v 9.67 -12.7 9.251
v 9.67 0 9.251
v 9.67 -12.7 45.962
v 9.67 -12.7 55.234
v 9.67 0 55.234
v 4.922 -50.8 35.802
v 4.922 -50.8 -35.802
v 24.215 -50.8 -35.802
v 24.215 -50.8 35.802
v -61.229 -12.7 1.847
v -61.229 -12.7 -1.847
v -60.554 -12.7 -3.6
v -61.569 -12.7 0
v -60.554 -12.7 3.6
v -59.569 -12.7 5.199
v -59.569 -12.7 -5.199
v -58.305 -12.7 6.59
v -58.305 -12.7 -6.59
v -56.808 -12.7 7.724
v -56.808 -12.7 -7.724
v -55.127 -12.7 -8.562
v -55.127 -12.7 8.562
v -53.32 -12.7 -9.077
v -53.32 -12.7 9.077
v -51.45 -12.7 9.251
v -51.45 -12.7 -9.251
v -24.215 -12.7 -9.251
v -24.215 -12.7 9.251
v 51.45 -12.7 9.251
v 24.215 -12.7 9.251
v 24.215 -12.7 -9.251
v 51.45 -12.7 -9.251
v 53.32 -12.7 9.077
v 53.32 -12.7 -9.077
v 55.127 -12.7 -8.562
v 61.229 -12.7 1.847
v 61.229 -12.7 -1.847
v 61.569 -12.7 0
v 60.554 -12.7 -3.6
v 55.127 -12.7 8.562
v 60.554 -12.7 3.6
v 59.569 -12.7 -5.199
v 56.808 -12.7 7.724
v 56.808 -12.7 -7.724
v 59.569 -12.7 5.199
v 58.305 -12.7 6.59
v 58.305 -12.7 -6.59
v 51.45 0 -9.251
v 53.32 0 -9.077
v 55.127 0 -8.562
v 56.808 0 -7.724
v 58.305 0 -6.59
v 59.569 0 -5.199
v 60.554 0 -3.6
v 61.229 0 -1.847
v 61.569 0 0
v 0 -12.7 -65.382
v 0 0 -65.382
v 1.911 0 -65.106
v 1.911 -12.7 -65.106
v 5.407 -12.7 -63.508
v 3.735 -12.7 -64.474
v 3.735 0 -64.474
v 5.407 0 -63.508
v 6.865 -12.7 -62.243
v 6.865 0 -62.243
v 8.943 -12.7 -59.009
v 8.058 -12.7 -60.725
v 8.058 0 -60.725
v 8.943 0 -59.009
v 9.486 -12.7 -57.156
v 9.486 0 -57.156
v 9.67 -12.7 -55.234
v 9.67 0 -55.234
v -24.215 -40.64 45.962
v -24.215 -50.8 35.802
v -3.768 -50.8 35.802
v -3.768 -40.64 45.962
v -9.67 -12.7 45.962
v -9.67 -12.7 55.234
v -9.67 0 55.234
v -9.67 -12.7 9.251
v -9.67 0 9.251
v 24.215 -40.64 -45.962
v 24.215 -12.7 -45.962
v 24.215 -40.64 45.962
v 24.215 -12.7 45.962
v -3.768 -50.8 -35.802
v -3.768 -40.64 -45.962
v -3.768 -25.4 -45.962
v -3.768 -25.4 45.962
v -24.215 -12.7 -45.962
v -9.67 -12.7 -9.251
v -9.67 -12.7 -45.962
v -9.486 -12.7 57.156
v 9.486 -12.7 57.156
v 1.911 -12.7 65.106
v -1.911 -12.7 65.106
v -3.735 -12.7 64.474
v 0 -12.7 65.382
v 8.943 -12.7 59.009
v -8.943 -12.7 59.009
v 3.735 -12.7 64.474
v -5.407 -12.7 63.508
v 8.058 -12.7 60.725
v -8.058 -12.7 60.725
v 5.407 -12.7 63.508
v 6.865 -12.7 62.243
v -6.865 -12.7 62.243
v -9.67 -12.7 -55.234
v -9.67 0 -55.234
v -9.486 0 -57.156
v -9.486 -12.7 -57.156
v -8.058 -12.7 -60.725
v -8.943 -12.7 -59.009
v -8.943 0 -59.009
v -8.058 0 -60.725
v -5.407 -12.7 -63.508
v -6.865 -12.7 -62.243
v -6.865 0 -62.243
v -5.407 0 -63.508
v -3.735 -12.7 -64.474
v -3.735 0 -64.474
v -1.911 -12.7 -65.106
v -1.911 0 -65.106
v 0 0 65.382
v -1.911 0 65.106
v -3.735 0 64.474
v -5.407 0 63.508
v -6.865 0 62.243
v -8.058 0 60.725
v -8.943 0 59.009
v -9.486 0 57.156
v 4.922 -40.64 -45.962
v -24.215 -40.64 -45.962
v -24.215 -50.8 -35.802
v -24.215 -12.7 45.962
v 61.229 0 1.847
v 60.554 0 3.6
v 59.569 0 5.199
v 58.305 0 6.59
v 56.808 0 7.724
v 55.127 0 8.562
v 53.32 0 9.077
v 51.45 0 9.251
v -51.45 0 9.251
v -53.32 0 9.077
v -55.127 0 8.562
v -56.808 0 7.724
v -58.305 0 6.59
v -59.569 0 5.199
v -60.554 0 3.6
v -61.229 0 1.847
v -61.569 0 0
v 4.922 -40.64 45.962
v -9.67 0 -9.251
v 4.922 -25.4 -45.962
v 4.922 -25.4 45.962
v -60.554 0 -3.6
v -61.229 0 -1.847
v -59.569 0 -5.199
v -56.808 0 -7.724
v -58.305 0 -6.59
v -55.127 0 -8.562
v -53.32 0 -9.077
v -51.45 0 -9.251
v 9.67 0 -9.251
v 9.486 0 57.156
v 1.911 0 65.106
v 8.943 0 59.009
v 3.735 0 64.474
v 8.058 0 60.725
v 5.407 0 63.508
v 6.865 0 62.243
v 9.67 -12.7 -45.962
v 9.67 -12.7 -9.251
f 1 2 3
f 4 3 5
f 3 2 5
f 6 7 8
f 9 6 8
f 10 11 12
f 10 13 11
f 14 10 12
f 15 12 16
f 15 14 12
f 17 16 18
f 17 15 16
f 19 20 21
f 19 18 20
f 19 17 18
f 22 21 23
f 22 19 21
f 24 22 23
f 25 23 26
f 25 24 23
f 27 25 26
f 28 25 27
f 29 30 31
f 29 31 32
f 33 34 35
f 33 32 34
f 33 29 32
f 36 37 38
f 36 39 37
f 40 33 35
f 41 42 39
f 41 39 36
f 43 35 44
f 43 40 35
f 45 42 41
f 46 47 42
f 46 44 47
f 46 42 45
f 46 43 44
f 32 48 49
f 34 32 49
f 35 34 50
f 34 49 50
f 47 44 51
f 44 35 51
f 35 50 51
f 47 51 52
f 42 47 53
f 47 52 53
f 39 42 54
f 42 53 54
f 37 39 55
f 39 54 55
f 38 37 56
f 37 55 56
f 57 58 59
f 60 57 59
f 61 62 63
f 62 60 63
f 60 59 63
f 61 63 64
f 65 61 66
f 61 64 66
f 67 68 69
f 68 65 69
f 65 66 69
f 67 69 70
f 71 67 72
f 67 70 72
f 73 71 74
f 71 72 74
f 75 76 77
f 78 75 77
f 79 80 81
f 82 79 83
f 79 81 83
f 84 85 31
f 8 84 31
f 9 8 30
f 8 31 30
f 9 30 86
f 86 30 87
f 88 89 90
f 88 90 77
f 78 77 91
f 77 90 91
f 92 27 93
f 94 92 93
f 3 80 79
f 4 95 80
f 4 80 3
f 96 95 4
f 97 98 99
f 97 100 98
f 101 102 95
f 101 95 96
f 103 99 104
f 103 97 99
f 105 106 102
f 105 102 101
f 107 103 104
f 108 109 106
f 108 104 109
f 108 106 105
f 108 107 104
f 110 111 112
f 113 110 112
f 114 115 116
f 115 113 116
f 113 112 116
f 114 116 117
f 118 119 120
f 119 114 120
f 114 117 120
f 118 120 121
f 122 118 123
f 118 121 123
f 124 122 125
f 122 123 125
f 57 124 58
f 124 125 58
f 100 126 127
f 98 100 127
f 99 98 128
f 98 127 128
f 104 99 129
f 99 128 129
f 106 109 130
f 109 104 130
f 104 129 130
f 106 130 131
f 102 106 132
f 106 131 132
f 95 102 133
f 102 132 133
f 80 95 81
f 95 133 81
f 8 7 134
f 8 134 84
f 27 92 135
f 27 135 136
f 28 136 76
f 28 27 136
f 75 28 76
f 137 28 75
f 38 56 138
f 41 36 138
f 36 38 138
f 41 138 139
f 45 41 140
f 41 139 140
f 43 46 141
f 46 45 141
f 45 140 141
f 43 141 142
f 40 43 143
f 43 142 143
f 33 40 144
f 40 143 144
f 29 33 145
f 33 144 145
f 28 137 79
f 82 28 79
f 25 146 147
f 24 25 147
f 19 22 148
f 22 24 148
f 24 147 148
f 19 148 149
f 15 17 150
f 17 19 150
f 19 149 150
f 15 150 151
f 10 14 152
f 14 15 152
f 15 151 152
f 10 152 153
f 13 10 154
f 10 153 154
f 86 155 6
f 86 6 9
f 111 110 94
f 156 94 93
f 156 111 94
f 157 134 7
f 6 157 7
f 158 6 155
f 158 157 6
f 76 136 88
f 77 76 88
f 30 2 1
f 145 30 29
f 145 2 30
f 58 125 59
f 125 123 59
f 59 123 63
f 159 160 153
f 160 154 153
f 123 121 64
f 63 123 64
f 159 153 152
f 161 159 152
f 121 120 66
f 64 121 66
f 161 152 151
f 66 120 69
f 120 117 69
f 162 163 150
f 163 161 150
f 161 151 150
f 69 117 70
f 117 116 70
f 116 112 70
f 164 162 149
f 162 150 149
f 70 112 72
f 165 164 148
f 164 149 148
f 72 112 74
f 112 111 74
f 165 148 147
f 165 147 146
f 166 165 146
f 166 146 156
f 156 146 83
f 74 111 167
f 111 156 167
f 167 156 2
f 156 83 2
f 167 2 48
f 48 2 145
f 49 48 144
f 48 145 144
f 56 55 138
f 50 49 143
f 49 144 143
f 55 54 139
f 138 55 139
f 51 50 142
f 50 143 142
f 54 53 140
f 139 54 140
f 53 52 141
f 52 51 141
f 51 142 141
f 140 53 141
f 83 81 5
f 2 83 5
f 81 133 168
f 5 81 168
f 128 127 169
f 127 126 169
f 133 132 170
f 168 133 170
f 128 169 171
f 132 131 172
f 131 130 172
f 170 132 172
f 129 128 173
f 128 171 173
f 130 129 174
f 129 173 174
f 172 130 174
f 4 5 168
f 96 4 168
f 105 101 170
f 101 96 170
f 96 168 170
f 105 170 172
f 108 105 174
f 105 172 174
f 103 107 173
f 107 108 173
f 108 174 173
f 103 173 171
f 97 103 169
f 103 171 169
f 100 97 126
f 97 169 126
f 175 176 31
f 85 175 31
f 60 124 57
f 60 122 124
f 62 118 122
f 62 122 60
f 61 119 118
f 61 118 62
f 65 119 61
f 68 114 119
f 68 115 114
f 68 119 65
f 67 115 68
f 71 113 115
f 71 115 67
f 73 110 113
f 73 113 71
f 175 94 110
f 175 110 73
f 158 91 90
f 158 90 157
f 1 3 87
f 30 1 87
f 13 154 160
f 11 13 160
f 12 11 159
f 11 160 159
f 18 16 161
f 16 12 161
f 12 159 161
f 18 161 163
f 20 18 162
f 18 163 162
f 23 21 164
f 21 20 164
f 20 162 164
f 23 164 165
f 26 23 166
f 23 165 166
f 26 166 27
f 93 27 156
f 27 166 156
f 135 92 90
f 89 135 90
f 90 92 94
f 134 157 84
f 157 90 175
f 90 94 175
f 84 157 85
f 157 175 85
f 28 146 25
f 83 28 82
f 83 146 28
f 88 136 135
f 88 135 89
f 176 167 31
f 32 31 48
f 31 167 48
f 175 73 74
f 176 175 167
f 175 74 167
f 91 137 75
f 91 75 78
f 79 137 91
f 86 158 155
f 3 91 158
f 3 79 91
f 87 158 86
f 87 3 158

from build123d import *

# Parameters (mm, degrees)
F0_W        = 19.3394050002
F0_H        = 56.1432316899
F0_W_2      = 51.9402250648
F0_H_2      = 18.5019075871
F1_DEPTH    = 12.7
F2_T1_DEPTH = 63.5
F3_W        = 48.4298244119
F3_H        = 91.9232070446
F4_DEPTH    = 12.7
F5_W        = 20.4465882853
F5_H        = 91.9232070446
F5_W_2      = 19.2932416685
F6_DEPTH    = 25.4
F7_SIZE     = 10.16


# Not quite as in the source:
# - a fillet or chamfer that OpenCascade refuses, or shapes differently, is made with other operations: its cross-section is extruded or revolved along the edge and cut away or added


with BuildPart() as f1:
    # F0 (on Front) → F1 (new body)
    with BuildSketch(Plane.XZ):
        with Locations((0, 37.3225696385)):
            Rectangle(F0_W, F0_H)
        with Locations((35.6398150325, 0)):
            Rectangle(F0_W_2, F0_H_2)
        Rectangle(F0_W, F0_H_2)
        with Locations((-35.6398150325, 0)):
            Rectangle(F0_W_2, F0_H_2)
        with Locations((0, -37.3225696385)):
            Rectangle(F0_W, F0_H)
    extrude(amount=F1_DEPTH)

    # F2: fillet of radius 10.16 on 8 edges, made by hand

    # F2_s2 → F2_t1 (cut)
    with BuildSketch(Plane.XZ.offset(-25.4)):
        with BuildLine():
            ThreePointArc((9.6697025001, 55.2341854835), (6.693907397, 62.4183903803), (-0.4902974999, 65.3941854835))
            Line((-0.4902974999, 65.3941854835), (9.6697025001, 65.3941854835))
            Line((9.6697025001, 65.3941854835), (9.6697025001, 55.2341854835))
        make_face()
        with BuildLine():
            ThreePointArc((0.4902974999, 65.3941854835), (-6.693907397, 62.4183903803), (-9.6697025001, 55.2341854835))
            Line((-9.6697025001, 55.2341854835), (-9.6697025001, 65.3941854835))
            Line((-9.6697025001, 65.3941854835), (0.4902974999, 65.3941854835))
        make_face()
        with BuildLine():
            ThreePointArc((61.6099275649, -0.9090462065), (58.6341324617, 6.2751586904), (51.4499275649, 9.2509537935))
            Line((51.4499275649, 9.2509537935), (61.6099275649, 9.2509537935))
            Line((61.6099275649, 9.2509537935), (61.6099275649, -0.9090462065))
        make_face()
        with BuildLine():
            ThreePointArc((51.4499275649, -9.2509537935), (58.6341324617, -6.2751586904), (61.6099275649, 0.9090462065))
            Line((61.6099275649, 0.9090462065), (61.6099275649, -9.2509537935))
            Line((61.6099275649, -9.2509537935), (51.4499275649, -9.2509537935))
        make_face()
        with BuildLine():
            ThreePointArc((-0.4902974999, -65.3941854835), (6.693907397, -62.4183903803), (9.6697025001, -55.2341854835))
            Line((9.6697025001, -55.2341854835), (9.6697025001, -65.3941854835))
            Line((9.6697025001, -65.3941854835), (-0.4902974999, -65.3941854835))
        make_face()
        with BuildLine():
            ThreePointArc((-51.4499275649, 9.2509537935), (-58.6341324617, 6.2751586904), (-61.6099275649, -0.9090462065))
            Line((-61.6099275649, -0.9090462065), (-61.6099275649, 9.2509537935))
            Line((-61.6099275649, 9.2509537935), (-51.4499275649, 9.2509537935))
        make_face()
        with BuildLine():
            ThreePointArc((-61.6099275649, 0.9090462065), (-58.6341324617, -6.2751586904), (-51.4499275649, -9.2509537935))
            Line((-51.4499275649, -9.2509537935), (-61.6099275649, -9.2509537935))
            Line((-61.6099275649, -9.2509537935), (-61.6099275649, 0.9090462065))
        make_face()
        with BuildLine():
            ThreePointArc((-9.6697025001, -55.2341854835), (-6.693907397, -62.4183903803), (0.4902974999, -65.3941854835))
            Line((0.4902974999, -65.3941854835), (-9.6697025001, -65.3941854835))
            Line((-9.6697025001, -65.3941854835), (-9.6697025001, -55.2341854835))
        make_face()
    extrude(amount=F2_T1_DEPTH, mode=Mode.SUBTRACT)

    # F3 (on face) → F4 (join)
    with BuildSketch(Plane.XZ.offset(12.7)):
        Rectangle(F3_W, F3_H)
    extrude(amount=F4_DEPTH)

    # F5 (on face) → F6 (join)
    with BuildSketch(Plane.XZ.offset(25.4)):
        with Locations((-13.9916180633, 0)):
            Rectangle(F5_W, F5_H)
        with Locations((14.5682913717, 0)):
            Rectangle(F5_W_2, F5_H)
    extrude(amount=F6_DEPTH)

    # F7
    f7_edges = [f1.edges().sort_by_distance(p)[0] for p in [
        (-13.991618, -50.8, 45.961604),
        (-13.991618, -50.8, -45.961604),
        (14.568291, -50.8, -45.961604),
        (14.568291, -50.8, 45.961604),
    ]]
    chamfer(f7_edges, length=F7_SIZE)


solid = f1.part
